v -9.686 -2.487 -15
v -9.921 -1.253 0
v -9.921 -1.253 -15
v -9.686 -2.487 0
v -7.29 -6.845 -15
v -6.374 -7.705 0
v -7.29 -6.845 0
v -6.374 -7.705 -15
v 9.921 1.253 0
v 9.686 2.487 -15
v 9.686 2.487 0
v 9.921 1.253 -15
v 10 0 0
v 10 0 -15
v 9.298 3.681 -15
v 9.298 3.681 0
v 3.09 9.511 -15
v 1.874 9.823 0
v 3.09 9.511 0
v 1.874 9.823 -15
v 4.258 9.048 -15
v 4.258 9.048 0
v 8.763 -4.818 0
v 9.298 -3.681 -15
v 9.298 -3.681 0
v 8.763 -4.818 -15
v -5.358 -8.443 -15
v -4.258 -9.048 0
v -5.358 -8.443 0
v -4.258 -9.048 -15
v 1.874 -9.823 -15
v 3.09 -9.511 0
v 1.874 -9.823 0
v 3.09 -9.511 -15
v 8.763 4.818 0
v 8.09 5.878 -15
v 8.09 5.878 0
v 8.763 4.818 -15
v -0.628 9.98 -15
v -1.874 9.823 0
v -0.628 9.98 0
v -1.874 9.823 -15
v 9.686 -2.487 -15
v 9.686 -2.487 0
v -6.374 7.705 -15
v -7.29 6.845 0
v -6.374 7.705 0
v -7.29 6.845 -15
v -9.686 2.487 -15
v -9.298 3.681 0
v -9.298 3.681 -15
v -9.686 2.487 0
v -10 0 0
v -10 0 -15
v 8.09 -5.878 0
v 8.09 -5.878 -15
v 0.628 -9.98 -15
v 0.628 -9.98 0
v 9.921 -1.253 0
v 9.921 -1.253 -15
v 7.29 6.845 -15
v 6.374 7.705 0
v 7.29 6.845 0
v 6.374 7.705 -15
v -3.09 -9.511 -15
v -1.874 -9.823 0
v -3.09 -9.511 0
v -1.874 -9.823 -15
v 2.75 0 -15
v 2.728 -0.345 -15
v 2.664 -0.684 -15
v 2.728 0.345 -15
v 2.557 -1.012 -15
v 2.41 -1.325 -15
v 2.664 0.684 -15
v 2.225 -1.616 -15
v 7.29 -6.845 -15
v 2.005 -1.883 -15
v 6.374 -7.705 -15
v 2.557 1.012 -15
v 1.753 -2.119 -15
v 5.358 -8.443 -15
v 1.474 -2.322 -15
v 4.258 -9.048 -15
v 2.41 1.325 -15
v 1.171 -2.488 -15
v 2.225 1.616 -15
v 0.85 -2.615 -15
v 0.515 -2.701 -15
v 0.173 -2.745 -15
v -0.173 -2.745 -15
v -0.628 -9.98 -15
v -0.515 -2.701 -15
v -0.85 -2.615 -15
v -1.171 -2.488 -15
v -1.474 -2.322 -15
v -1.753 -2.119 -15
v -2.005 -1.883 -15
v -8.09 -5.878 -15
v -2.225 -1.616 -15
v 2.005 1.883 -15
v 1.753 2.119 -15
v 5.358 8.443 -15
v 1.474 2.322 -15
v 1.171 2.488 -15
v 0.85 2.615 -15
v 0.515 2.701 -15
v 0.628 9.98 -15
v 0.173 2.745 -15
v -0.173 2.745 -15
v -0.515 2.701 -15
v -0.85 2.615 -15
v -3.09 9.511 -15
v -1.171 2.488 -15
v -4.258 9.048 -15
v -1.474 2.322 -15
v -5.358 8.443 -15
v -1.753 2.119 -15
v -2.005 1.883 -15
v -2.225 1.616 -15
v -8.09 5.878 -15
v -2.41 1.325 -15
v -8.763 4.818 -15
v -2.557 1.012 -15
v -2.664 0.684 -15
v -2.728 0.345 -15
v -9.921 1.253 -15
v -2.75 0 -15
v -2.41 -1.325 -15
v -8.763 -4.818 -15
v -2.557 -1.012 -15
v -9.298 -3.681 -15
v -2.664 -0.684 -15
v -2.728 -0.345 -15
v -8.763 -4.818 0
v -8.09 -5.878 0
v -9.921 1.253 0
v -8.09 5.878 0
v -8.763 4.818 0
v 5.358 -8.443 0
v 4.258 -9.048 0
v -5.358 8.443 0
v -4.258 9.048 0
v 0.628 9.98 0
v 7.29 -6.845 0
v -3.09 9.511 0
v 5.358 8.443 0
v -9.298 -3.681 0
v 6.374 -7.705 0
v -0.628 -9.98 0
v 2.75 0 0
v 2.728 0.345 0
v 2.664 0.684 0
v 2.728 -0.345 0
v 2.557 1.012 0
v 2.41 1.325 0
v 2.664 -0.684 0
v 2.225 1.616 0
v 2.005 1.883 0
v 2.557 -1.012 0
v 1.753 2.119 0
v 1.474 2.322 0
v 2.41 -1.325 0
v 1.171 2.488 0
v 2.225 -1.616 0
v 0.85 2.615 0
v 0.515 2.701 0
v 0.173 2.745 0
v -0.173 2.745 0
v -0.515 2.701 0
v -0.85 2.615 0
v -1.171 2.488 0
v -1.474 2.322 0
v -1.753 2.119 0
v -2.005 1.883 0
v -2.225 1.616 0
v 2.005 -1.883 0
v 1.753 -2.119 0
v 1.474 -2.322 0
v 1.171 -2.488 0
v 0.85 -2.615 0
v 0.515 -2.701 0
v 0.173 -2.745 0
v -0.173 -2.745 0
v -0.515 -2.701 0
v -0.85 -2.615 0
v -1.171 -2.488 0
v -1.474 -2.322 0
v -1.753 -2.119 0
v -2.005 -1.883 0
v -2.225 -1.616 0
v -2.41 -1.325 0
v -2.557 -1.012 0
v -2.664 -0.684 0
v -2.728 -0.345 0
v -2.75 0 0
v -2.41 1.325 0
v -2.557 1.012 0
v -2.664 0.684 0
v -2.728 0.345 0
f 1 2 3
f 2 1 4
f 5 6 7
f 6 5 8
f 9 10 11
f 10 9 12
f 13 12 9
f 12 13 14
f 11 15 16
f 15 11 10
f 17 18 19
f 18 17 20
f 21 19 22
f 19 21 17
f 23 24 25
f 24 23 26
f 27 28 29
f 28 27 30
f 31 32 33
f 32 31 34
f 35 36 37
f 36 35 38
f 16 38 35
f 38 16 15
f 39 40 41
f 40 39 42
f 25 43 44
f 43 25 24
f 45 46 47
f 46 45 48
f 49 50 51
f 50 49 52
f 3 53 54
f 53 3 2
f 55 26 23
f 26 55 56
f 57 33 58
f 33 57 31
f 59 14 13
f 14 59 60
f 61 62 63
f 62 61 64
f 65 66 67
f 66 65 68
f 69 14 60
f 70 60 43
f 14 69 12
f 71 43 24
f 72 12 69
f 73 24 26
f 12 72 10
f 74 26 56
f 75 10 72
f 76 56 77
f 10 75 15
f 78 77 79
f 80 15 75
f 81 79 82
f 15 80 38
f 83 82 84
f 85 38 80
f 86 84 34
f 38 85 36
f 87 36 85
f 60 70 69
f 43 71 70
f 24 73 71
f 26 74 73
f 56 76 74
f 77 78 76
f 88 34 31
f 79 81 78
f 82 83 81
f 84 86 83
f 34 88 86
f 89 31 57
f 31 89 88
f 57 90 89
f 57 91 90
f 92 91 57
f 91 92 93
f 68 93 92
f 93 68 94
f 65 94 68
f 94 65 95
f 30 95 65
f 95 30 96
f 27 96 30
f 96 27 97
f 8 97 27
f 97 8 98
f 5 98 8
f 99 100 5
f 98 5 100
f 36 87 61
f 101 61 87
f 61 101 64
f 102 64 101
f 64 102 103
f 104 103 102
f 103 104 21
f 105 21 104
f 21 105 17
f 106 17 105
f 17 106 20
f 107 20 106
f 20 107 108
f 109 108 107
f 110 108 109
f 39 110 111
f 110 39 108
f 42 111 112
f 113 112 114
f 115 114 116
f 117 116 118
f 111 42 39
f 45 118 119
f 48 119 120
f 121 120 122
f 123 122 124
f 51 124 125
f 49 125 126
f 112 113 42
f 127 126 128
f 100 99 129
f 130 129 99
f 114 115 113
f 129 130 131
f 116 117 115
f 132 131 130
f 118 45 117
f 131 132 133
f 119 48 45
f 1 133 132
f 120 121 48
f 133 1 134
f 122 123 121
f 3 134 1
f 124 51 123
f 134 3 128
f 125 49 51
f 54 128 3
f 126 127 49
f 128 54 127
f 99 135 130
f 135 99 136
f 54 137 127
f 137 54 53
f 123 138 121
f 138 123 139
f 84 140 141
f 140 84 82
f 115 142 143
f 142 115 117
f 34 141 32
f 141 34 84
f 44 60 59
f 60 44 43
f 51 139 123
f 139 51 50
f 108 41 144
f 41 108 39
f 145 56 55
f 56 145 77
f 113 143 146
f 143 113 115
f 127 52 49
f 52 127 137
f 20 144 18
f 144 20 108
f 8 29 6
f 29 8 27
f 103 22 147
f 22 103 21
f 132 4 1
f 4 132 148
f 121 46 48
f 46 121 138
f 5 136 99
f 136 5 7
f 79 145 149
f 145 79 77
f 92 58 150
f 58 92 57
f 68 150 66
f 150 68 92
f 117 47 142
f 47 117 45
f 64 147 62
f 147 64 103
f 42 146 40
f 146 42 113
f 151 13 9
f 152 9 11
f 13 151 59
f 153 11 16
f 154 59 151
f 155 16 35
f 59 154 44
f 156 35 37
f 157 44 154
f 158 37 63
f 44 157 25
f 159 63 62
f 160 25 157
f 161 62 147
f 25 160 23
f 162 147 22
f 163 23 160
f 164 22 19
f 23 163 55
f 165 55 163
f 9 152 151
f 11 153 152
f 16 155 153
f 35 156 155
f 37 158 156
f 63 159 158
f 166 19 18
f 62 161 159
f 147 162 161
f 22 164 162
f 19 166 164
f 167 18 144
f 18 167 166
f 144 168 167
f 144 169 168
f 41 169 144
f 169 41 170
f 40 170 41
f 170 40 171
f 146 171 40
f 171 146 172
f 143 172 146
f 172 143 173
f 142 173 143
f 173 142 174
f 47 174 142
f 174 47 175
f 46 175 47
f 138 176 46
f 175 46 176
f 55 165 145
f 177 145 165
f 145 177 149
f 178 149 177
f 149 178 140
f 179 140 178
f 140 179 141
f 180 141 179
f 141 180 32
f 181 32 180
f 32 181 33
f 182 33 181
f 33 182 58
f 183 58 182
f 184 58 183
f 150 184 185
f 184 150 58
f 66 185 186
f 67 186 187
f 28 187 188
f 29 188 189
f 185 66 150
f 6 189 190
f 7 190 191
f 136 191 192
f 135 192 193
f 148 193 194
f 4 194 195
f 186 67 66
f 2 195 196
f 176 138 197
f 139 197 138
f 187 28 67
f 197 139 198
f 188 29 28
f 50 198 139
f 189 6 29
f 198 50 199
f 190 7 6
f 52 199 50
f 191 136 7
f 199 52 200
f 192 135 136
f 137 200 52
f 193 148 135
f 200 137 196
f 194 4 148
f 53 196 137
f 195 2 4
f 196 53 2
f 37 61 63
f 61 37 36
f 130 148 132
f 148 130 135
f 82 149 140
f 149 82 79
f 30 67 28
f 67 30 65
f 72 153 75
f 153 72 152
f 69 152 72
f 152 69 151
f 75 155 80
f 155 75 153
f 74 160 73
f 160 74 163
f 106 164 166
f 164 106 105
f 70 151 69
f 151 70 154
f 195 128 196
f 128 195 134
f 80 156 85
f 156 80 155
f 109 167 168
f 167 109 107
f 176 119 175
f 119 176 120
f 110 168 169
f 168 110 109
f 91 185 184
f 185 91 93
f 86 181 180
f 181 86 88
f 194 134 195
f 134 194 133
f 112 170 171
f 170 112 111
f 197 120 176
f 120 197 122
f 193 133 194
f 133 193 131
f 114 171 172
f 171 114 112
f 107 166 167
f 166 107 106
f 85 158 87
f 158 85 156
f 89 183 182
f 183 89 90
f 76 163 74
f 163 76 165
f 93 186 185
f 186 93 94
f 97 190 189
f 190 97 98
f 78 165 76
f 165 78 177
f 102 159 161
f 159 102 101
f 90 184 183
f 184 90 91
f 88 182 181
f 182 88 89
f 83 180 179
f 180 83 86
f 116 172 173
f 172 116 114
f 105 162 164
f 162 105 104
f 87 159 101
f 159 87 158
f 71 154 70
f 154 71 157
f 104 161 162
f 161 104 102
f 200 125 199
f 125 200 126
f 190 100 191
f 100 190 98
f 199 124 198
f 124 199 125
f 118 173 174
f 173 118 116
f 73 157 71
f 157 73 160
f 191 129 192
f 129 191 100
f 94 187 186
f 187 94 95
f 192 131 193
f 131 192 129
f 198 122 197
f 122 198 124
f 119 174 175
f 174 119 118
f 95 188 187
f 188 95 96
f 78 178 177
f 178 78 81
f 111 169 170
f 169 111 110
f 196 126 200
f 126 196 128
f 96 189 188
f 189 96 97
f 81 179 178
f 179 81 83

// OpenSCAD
$fn = 50;


difference() {
	union() {
		translate(v = [0, 0, -15.0000000000]) {
			cylinder(h = 15, r = 10.0000000000);
		}
		cylinder(h = 0, r = 13.0000000000);
	}
	union() {
		#translate(v = [0, 0, -15]) {
			cylinder(h = 15, r = 2.7500000000);
		}
	}
}
